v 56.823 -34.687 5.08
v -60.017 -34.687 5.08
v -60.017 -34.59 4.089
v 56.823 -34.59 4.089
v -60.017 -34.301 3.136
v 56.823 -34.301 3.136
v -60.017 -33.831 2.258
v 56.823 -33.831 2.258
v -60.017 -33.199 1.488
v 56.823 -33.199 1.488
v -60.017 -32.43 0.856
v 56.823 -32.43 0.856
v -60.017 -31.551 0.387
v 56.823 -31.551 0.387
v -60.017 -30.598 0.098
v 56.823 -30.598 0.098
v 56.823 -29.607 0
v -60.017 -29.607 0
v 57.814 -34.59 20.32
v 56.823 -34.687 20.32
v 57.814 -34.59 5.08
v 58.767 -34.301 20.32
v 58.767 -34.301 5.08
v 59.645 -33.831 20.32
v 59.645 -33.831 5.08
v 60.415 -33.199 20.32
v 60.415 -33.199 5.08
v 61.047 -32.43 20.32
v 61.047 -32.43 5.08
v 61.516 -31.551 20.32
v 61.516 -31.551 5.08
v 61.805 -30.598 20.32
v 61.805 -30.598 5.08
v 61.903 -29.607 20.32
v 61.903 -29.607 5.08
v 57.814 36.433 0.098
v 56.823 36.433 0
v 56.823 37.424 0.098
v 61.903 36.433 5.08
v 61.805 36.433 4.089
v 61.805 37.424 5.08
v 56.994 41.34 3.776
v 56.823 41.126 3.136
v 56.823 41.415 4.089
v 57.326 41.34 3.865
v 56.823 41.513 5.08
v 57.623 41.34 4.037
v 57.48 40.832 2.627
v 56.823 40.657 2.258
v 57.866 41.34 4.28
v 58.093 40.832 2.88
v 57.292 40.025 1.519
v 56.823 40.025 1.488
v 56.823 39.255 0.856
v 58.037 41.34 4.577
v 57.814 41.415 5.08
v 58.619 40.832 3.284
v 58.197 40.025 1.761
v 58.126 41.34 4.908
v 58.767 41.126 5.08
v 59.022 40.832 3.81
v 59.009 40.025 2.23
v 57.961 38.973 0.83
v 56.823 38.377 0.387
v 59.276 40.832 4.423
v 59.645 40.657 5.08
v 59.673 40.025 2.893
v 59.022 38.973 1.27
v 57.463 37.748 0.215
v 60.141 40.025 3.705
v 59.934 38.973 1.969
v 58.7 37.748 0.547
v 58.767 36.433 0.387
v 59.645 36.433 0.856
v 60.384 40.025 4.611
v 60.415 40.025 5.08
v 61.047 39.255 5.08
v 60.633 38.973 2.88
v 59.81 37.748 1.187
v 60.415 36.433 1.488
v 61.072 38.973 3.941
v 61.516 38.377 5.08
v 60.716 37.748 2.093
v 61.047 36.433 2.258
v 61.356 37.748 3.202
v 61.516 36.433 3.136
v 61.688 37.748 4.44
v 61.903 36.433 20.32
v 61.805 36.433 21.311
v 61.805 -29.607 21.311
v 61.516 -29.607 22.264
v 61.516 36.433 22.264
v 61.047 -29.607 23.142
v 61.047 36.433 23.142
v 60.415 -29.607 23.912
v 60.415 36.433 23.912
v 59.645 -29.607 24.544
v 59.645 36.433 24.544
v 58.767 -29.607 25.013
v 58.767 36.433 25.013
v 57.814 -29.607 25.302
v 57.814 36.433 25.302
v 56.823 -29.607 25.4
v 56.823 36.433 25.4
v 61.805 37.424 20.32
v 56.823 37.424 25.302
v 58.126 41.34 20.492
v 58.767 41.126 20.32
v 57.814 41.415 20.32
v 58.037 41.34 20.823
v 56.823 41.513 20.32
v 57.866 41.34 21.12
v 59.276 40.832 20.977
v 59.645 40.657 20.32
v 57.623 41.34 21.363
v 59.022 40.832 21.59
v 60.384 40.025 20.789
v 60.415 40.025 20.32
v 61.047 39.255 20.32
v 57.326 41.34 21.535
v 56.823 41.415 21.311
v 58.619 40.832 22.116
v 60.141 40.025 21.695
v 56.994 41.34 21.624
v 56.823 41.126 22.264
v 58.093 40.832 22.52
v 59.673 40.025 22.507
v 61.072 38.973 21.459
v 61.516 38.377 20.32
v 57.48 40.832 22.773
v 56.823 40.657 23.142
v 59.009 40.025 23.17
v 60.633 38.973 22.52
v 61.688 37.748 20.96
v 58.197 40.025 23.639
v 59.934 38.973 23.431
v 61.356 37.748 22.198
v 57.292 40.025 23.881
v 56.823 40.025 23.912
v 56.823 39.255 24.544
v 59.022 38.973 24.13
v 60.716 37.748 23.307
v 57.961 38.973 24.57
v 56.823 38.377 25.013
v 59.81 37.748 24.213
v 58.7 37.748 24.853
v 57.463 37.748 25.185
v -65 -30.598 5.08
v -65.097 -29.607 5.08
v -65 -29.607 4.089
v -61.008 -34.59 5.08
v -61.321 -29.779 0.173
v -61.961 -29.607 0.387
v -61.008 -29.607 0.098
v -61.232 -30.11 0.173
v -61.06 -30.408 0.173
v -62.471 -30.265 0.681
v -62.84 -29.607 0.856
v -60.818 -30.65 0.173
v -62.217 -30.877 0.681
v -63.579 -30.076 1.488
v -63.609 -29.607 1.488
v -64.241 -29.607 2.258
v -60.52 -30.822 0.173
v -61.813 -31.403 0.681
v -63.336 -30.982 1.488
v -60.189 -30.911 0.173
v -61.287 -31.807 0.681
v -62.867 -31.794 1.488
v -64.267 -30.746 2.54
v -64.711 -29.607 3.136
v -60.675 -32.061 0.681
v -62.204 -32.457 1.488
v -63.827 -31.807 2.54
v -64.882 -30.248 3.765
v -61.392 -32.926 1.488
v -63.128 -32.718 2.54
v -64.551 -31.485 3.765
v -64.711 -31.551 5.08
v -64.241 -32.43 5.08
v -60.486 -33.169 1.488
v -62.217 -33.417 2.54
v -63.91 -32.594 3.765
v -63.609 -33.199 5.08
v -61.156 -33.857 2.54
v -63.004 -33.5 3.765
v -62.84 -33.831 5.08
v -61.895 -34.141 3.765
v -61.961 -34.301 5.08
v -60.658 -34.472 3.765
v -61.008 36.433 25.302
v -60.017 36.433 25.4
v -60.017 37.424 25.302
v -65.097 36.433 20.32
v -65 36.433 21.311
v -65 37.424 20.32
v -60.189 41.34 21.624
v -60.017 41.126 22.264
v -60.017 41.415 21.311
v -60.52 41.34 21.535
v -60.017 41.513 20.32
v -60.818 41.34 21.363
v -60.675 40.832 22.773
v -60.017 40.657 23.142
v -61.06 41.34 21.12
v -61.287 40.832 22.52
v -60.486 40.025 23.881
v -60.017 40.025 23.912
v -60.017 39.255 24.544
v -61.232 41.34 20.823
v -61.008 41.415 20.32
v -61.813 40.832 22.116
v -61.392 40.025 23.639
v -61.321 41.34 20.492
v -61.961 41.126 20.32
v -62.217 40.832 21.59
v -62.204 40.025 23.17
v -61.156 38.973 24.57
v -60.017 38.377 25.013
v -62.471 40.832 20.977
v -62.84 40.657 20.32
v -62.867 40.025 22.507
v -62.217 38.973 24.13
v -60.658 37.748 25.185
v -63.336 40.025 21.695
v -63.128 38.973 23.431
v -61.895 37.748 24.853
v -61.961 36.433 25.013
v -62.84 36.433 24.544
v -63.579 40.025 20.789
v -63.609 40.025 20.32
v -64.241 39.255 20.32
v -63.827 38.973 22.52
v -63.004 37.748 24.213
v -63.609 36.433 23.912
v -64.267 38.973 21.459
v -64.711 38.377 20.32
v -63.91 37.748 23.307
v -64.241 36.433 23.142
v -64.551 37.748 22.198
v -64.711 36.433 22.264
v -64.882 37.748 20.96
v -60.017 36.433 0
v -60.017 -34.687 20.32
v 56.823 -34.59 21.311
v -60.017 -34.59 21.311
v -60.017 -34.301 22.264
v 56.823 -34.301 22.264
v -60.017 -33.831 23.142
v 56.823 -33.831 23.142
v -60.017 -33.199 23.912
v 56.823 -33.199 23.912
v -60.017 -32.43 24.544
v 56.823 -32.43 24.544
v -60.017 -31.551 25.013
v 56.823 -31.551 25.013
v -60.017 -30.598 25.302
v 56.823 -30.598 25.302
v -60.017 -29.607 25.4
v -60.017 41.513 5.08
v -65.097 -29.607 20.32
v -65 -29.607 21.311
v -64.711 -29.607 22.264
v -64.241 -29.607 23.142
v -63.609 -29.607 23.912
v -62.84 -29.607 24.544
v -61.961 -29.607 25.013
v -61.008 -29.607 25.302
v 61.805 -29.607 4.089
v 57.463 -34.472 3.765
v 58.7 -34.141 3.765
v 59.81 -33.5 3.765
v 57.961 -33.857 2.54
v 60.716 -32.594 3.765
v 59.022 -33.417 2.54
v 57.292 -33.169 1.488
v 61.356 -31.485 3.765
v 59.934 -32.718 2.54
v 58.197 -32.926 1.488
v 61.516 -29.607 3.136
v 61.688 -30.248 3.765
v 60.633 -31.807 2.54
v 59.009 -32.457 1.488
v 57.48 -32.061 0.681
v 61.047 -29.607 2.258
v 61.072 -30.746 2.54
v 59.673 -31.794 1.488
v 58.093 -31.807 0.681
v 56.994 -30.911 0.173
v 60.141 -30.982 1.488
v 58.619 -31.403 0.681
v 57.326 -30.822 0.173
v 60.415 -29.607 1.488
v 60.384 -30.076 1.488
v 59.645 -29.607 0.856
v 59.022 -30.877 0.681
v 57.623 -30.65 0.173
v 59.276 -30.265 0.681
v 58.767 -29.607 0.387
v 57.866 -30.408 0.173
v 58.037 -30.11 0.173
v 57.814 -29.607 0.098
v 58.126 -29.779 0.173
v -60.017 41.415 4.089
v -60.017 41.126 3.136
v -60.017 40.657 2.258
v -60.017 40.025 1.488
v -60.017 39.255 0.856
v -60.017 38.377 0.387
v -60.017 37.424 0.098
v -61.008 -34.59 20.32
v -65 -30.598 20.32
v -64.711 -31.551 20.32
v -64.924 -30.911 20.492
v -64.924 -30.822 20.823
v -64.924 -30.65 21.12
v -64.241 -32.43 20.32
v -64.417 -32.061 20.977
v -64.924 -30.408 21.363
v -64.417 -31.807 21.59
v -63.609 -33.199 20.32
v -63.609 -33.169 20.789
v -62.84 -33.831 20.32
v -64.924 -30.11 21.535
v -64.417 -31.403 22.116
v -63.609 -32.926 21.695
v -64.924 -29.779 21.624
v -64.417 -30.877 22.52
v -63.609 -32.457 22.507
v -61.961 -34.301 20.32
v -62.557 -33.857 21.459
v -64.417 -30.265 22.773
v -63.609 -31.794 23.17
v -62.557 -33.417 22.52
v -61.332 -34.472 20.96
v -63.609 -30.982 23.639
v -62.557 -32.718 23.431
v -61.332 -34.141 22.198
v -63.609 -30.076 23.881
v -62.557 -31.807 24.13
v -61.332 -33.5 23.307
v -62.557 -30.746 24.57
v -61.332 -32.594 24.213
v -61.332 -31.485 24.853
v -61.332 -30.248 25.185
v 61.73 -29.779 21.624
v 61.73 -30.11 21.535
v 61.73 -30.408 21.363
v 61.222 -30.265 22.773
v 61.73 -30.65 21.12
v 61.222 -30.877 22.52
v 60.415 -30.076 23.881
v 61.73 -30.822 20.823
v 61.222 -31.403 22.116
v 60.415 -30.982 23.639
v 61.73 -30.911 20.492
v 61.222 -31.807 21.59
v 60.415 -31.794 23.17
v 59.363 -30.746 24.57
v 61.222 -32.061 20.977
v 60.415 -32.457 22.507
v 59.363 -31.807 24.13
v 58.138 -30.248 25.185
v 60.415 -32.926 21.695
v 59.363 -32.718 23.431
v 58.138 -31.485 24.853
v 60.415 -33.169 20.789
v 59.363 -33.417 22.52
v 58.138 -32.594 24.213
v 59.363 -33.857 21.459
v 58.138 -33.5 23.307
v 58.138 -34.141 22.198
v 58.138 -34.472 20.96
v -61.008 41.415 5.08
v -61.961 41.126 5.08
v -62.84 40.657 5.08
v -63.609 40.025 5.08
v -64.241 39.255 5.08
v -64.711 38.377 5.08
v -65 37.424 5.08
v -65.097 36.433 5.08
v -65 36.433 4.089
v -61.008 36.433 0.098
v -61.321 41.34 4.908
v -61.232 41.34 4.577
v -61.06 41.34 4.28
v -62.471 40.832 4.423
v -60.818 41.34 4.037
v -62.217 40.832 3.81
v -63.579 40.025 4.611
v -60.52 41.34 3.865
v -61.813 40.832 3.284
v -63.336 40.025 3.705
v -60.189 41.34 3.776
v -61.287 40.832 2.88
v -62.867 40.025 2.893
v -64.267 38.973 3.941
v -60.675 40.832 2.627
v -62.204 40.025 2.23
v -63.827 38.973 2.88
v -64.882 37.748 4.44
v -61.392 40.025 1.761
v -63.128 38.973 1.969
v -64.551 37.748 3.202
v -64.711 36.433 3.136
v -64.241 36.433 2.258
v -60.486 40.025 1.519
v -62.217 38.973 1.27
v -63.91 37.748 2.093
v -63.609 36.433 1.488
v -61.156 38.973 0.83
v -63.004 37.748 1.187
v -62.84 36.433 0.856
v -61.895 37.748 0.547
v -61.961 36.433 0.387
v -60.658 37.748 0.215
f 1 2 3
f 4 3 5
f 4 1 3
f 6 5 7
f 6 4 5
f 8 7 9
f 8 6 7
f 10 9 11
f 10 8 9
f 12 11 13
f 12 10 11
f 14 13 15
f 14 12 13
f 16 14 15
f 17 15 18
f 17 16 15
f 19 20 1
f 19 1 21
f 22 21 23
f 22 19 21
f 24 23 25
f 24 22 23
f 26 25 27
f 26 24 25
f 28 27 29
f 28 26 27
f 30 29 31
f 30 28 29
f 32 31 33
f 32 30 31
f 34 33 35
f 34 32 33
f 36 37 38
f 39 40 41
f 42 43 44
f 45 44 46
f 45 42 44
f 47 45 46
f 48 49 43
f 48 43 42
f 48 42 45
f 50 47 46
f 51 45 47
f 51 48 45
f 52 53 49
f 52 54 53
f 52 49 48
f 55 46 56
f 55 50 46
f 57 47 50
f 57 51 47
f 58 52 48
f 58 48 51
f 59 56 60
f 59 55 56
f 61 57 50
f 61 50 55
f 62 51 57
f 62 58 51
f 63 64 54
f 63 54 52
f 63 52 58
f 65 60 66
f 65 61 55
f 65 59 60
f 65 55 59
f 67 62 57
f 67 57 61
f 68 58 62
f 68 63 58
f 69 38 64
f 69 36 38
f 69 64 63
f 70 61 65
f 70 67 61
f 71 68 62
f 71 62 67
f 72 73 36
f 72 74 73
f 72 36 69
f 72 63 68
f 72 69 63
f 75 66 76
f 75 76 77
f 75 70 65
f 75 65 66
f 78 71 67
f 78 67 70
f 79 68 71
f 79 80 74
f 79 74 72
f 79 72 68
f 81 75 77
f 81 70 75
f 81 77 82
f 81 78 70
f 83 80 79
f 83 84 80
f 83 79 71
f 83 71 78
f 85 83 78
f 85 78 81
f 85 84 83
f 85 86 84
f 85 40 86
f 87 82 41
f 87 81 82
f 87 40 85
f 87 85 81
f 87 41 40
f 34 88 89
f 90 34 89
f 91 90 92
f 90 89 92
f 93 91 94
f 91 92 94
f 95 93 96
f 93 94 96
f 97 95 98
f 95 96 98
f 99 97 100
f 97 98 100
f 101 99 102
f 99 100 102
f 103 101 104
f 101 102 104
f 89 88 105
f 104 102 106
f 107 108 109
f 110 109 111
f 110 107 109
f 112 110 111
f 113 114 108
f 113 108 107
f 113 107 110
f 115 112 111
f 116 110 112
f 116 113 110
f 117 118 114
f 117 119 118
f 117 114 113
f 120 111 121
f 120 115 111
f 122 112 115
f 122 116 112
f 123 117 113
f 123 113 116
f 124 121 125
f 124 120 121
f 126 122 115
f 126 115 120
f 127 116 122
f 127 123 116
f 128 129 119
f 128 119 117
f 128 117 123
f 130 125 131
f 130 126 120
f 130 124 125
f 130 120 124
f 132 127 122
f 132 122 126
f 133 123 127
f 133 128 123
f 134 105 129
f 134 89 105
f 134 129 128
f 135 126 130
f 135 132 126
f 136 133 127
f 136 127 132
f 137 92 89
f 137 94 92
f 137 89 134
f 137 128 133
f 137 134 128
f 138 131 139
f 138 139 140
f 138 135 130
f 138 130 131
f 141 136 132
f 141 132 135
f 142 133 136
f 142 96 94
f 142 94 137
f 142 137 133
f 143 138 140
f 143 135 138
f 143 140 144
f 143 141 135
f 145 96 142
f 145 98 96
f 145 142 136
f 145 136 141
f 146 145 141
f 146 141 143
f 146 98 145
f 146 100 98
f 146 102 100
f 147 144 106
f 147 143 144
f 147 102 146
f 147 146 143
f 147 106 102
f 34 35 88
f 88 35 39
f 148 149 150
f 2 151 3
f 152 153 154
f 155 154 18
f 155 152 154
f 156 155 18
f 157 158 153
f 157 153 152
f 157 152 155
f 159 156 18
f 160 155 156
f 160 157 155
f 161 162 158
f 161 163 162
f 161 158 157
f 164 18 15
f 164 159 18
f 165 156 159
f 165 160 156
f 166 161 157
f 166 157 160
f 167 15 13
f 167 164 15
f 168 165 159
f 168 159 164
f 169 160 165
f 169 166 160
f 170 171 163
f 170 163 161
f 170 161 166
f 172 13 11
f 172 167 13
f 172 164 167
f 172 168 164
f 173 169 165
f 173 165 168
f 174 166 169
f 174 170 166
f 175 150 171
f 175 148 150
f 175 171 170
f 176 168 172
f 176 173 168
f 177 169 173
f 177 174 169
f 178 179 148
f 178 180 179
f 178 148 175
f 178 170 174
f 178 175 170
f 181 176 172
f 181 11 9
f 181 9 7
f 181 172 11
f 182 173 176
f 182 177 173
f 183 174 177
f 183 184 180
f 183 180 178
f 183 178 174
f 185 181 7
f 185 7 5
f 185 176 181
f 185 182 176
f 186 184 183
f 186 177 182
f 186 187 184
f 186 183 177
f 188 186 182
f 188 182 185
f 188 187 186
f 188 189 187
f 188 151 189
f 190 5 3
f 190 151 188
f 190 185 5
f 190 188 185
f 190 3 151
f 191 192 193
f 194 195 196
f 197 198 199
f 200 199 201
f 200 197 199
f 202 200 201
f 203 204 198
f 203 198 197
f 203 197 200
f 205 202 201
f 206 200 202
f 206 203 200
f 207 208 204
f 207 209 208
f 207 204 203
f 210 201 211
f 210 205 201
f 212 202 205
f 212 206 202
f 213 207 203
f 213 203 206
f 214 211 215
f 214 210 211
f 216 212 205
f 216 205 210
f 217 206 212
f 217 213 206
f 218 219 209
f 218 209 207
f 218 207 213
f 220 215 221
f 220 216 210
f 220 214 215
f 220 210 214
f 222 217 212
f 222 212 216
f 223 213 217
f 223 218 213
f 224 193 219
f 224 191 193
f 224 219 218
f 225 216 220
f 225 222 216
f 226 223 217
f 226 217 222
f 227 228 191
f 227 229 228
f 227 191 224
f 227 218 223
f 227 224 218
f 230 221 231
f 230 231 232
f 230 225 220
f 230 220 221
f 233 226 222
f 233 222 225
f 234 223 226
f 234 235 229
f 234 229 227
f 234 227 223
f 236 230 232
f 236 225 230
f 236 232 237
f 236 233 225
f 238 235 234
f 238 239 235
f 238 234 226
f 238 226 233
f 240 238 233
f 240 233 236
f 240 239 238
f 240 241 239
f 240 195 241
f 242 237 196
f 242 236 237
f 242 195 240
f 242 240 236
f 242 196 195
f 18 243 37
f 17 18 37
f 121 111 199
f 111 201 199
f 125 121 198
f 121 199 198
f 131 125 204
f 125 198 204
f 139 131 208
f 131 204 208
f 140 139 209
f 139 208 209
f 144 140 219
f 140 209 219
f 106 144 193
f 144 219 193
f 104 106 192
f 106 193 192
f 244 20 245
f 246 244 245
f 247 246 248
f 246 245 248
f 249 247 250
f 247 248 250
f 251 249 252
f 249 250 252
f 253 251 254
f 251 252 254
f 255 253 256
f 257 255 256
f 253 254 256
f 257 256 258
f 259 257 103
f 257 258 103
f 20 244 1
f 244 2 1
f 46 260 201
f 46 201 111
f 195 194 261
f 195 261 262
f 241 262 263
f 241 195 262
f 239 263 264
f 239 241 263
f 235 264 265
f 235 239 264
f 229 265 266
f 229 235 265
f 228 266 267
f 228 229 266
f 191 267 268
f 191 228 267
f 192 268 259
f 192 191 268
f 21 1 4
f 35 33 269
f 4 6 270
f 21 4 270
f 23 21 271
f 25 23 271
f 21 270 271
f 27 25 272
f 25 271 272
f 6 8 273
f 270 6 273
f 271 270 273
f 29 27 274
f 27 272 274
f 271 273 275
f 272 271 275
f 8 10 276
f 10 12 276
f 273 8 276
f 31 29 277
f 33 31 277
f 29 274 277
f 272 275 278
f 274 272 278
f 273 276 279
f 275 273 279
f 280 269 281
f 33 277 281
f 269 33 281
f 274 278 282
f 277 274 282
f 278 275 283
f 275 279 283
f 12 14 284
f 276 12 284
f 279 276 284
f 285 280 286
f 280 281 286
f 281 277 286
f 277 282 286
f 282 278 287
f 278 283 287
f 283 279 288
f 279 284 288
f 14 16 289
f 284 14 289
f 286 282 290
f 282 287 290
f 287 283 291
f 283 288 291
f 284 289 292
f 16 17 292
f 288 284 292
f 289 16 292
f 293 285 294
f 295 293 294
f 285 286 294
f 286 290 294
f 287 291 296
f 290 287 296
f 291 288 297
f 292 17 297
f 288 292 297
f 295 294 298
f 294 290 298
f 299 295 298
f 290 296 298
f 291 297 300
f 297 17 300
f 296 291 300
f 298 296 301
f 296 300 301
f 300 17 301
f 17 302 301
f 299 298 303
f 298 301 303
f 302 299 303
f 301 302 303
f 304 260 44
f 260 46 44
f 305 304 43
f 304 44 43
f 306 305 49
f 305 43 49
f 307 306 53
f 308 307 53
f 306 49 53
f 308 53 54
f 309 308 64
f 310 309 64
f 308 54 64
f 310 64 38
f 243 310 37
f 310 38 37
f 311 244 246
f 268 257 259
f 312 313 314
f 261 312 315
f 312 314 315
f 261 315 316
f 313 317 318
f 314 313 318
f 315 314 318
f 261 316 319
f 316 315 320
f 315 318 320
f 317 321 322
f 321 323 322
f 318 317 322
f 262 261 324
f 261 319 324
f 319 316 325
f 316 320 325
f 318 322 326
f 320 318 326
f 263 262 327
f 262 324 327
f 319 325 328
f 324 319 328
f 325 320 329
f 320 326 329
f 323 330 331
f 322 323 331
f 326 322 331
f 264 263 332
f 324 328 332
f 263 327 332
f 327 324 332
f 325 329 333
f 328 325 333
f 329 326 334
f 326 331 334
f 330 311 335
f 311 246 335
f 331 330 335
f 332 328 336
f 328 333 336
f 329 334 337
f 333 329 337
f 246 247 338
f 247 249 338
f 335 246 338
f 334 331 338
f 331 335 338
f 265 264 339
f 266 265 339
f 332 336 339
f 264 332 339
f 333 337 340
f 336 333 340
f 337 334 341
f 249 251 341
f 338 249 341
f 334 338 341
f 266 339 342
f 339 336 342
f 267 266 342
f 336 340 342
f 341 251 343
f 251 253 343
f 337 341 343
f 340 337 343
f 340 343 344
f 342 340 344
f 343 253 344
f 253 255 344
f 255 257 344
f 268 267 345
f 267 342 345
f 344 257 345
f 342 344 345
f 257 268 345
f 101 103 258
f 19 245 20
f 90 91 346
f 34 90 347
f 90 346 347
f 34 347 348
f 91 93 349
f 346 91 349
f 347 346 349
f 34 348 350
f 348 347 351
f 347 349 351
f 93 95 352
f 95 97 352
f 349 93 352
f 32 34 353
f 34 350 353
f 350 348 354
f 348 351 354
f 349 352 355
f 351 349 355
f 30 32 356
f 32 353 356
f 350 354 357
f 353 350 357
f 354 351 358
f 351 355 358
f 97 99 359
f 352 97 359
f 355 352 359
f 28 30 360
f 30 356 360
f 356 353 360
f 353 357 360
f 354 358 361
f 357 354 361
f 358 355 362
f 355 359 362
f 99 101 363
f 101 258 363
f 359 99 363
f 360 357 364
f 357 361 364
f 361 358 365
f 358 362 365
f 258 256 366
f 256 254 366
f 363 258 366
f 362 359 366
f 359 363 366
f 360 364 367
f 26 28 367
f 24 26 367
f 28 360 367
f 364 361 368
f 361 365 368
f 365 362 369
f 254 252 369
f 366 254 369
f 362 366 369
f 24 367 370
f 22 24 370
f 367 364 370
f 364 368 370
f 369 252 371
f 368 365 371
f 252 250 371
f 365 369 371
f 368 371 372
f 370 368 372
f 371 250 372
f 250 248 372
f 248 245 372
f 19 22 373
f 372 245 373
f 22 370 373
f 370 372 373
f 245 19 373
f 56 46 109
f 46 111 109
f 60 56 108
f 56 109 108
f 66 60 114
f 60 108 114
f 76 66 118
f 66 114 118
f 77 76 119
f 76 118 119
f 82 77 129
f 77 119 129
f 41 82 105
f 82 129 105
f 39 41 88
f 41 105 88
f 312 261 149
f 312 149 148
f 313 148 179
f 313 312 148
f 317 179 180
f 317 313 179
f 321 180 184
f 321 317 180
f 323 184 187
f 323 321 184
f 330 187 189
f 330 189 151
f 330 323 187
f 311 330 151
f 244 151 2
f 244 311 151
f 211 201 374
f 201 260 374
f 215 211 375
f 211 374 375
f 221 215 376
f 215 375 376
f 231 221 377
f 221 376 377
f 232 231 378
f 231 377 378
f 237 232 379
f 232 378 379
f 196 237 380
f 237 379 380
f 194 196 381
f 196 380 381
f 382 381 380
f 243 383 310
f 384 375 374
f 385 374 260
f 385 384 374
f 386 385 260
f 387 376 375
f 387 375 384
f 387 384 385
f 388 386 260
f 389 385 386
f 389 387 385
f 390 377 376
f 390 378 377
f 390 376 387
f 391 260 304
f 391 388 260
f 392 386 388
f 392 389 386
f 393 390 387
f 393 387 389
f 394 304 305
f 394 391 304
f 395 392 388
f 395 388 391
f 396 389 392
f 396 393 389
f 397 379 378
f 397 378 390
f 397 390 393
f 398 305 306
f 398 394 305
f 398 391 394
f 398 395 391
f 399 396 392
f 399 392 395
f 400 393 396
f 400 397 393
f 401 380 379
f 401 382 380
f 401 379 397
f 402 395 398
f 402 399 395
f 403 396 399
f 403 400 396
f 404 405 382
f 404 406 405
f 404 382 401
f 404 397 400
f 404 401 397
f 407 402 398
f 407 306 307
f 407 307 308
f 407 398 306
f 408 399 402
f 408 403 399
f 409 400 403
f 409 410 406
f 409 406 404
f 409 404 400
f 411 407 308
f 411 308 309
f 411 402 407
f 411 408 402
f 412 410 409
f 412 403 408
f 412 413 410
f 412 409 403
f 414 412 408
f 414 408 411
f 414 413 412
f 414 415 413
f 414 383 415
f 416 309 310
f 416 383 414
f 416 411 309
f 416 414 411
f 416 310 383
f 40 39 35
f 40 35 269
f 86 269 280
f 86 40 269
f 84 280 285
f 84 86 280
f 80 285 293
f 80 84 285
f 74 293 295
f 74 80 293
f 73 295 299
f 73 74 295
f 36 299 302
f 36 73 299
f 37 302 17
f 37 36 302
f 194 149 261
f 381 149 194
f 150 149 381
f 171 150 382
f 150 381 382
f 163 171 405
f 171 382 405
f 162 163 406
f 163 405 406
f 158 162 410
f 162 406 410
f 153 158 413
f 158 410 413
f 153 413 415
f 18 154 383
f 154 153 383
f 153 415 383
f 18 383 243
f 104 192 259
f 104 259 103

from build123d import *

# Parameters (mm, degrees)
F0_W     = 127
F0_H     = 76.2
F1_DEPTH = 25.4
F2_R     = 5.08
F3_R     = 5.08
F4_R     = 5.08


with BuildPart() as f1:
    # F0 (on Top) → F1 (new body)
    with BuildSketch(Plane.XY):
        with Locations((-1.597298, 3.412767)):
            Rectangle(F0_W, F0_H)
    extrude(amount=F1_DEPTH)

    # F2
    f2_edges = [f1.edges().sort_by_distance(p)[0] for p in [
        (-1.597298, -34.687233, 25.4),
        (61.902702, 3.412767, 25.4),
        (61.902702, -34.687233, 12.7),
    ]]
    fillet(f2_edges, radius=F2_R)

    # F3
    f3_edges = [f1.edges().sort_by_distance(p)[0] for p in [
        (-65.097298, 5.952767, 25.4),
        (-65.097298, -34.687233, 10.16),
        (-65.097298, 3.412767, 0),
        (-4.137298, -34.687233, 0),
    ]]
    fillet(f3_edges, radius=F3_R)

    # F4
    f4_edges = [f1.edges().sort_by_distance(p)[0] for p in [
        (-1.597298, 41.512767, 0),
        (61.902702, 41.512767, 12.7),
        (-1.597298, 41.512767, 25.4),
        (-65.097298, 41.512767, 12.7),
    ]]
    fillet(f4_edges, radius=F4_R)


solid = f1.part
